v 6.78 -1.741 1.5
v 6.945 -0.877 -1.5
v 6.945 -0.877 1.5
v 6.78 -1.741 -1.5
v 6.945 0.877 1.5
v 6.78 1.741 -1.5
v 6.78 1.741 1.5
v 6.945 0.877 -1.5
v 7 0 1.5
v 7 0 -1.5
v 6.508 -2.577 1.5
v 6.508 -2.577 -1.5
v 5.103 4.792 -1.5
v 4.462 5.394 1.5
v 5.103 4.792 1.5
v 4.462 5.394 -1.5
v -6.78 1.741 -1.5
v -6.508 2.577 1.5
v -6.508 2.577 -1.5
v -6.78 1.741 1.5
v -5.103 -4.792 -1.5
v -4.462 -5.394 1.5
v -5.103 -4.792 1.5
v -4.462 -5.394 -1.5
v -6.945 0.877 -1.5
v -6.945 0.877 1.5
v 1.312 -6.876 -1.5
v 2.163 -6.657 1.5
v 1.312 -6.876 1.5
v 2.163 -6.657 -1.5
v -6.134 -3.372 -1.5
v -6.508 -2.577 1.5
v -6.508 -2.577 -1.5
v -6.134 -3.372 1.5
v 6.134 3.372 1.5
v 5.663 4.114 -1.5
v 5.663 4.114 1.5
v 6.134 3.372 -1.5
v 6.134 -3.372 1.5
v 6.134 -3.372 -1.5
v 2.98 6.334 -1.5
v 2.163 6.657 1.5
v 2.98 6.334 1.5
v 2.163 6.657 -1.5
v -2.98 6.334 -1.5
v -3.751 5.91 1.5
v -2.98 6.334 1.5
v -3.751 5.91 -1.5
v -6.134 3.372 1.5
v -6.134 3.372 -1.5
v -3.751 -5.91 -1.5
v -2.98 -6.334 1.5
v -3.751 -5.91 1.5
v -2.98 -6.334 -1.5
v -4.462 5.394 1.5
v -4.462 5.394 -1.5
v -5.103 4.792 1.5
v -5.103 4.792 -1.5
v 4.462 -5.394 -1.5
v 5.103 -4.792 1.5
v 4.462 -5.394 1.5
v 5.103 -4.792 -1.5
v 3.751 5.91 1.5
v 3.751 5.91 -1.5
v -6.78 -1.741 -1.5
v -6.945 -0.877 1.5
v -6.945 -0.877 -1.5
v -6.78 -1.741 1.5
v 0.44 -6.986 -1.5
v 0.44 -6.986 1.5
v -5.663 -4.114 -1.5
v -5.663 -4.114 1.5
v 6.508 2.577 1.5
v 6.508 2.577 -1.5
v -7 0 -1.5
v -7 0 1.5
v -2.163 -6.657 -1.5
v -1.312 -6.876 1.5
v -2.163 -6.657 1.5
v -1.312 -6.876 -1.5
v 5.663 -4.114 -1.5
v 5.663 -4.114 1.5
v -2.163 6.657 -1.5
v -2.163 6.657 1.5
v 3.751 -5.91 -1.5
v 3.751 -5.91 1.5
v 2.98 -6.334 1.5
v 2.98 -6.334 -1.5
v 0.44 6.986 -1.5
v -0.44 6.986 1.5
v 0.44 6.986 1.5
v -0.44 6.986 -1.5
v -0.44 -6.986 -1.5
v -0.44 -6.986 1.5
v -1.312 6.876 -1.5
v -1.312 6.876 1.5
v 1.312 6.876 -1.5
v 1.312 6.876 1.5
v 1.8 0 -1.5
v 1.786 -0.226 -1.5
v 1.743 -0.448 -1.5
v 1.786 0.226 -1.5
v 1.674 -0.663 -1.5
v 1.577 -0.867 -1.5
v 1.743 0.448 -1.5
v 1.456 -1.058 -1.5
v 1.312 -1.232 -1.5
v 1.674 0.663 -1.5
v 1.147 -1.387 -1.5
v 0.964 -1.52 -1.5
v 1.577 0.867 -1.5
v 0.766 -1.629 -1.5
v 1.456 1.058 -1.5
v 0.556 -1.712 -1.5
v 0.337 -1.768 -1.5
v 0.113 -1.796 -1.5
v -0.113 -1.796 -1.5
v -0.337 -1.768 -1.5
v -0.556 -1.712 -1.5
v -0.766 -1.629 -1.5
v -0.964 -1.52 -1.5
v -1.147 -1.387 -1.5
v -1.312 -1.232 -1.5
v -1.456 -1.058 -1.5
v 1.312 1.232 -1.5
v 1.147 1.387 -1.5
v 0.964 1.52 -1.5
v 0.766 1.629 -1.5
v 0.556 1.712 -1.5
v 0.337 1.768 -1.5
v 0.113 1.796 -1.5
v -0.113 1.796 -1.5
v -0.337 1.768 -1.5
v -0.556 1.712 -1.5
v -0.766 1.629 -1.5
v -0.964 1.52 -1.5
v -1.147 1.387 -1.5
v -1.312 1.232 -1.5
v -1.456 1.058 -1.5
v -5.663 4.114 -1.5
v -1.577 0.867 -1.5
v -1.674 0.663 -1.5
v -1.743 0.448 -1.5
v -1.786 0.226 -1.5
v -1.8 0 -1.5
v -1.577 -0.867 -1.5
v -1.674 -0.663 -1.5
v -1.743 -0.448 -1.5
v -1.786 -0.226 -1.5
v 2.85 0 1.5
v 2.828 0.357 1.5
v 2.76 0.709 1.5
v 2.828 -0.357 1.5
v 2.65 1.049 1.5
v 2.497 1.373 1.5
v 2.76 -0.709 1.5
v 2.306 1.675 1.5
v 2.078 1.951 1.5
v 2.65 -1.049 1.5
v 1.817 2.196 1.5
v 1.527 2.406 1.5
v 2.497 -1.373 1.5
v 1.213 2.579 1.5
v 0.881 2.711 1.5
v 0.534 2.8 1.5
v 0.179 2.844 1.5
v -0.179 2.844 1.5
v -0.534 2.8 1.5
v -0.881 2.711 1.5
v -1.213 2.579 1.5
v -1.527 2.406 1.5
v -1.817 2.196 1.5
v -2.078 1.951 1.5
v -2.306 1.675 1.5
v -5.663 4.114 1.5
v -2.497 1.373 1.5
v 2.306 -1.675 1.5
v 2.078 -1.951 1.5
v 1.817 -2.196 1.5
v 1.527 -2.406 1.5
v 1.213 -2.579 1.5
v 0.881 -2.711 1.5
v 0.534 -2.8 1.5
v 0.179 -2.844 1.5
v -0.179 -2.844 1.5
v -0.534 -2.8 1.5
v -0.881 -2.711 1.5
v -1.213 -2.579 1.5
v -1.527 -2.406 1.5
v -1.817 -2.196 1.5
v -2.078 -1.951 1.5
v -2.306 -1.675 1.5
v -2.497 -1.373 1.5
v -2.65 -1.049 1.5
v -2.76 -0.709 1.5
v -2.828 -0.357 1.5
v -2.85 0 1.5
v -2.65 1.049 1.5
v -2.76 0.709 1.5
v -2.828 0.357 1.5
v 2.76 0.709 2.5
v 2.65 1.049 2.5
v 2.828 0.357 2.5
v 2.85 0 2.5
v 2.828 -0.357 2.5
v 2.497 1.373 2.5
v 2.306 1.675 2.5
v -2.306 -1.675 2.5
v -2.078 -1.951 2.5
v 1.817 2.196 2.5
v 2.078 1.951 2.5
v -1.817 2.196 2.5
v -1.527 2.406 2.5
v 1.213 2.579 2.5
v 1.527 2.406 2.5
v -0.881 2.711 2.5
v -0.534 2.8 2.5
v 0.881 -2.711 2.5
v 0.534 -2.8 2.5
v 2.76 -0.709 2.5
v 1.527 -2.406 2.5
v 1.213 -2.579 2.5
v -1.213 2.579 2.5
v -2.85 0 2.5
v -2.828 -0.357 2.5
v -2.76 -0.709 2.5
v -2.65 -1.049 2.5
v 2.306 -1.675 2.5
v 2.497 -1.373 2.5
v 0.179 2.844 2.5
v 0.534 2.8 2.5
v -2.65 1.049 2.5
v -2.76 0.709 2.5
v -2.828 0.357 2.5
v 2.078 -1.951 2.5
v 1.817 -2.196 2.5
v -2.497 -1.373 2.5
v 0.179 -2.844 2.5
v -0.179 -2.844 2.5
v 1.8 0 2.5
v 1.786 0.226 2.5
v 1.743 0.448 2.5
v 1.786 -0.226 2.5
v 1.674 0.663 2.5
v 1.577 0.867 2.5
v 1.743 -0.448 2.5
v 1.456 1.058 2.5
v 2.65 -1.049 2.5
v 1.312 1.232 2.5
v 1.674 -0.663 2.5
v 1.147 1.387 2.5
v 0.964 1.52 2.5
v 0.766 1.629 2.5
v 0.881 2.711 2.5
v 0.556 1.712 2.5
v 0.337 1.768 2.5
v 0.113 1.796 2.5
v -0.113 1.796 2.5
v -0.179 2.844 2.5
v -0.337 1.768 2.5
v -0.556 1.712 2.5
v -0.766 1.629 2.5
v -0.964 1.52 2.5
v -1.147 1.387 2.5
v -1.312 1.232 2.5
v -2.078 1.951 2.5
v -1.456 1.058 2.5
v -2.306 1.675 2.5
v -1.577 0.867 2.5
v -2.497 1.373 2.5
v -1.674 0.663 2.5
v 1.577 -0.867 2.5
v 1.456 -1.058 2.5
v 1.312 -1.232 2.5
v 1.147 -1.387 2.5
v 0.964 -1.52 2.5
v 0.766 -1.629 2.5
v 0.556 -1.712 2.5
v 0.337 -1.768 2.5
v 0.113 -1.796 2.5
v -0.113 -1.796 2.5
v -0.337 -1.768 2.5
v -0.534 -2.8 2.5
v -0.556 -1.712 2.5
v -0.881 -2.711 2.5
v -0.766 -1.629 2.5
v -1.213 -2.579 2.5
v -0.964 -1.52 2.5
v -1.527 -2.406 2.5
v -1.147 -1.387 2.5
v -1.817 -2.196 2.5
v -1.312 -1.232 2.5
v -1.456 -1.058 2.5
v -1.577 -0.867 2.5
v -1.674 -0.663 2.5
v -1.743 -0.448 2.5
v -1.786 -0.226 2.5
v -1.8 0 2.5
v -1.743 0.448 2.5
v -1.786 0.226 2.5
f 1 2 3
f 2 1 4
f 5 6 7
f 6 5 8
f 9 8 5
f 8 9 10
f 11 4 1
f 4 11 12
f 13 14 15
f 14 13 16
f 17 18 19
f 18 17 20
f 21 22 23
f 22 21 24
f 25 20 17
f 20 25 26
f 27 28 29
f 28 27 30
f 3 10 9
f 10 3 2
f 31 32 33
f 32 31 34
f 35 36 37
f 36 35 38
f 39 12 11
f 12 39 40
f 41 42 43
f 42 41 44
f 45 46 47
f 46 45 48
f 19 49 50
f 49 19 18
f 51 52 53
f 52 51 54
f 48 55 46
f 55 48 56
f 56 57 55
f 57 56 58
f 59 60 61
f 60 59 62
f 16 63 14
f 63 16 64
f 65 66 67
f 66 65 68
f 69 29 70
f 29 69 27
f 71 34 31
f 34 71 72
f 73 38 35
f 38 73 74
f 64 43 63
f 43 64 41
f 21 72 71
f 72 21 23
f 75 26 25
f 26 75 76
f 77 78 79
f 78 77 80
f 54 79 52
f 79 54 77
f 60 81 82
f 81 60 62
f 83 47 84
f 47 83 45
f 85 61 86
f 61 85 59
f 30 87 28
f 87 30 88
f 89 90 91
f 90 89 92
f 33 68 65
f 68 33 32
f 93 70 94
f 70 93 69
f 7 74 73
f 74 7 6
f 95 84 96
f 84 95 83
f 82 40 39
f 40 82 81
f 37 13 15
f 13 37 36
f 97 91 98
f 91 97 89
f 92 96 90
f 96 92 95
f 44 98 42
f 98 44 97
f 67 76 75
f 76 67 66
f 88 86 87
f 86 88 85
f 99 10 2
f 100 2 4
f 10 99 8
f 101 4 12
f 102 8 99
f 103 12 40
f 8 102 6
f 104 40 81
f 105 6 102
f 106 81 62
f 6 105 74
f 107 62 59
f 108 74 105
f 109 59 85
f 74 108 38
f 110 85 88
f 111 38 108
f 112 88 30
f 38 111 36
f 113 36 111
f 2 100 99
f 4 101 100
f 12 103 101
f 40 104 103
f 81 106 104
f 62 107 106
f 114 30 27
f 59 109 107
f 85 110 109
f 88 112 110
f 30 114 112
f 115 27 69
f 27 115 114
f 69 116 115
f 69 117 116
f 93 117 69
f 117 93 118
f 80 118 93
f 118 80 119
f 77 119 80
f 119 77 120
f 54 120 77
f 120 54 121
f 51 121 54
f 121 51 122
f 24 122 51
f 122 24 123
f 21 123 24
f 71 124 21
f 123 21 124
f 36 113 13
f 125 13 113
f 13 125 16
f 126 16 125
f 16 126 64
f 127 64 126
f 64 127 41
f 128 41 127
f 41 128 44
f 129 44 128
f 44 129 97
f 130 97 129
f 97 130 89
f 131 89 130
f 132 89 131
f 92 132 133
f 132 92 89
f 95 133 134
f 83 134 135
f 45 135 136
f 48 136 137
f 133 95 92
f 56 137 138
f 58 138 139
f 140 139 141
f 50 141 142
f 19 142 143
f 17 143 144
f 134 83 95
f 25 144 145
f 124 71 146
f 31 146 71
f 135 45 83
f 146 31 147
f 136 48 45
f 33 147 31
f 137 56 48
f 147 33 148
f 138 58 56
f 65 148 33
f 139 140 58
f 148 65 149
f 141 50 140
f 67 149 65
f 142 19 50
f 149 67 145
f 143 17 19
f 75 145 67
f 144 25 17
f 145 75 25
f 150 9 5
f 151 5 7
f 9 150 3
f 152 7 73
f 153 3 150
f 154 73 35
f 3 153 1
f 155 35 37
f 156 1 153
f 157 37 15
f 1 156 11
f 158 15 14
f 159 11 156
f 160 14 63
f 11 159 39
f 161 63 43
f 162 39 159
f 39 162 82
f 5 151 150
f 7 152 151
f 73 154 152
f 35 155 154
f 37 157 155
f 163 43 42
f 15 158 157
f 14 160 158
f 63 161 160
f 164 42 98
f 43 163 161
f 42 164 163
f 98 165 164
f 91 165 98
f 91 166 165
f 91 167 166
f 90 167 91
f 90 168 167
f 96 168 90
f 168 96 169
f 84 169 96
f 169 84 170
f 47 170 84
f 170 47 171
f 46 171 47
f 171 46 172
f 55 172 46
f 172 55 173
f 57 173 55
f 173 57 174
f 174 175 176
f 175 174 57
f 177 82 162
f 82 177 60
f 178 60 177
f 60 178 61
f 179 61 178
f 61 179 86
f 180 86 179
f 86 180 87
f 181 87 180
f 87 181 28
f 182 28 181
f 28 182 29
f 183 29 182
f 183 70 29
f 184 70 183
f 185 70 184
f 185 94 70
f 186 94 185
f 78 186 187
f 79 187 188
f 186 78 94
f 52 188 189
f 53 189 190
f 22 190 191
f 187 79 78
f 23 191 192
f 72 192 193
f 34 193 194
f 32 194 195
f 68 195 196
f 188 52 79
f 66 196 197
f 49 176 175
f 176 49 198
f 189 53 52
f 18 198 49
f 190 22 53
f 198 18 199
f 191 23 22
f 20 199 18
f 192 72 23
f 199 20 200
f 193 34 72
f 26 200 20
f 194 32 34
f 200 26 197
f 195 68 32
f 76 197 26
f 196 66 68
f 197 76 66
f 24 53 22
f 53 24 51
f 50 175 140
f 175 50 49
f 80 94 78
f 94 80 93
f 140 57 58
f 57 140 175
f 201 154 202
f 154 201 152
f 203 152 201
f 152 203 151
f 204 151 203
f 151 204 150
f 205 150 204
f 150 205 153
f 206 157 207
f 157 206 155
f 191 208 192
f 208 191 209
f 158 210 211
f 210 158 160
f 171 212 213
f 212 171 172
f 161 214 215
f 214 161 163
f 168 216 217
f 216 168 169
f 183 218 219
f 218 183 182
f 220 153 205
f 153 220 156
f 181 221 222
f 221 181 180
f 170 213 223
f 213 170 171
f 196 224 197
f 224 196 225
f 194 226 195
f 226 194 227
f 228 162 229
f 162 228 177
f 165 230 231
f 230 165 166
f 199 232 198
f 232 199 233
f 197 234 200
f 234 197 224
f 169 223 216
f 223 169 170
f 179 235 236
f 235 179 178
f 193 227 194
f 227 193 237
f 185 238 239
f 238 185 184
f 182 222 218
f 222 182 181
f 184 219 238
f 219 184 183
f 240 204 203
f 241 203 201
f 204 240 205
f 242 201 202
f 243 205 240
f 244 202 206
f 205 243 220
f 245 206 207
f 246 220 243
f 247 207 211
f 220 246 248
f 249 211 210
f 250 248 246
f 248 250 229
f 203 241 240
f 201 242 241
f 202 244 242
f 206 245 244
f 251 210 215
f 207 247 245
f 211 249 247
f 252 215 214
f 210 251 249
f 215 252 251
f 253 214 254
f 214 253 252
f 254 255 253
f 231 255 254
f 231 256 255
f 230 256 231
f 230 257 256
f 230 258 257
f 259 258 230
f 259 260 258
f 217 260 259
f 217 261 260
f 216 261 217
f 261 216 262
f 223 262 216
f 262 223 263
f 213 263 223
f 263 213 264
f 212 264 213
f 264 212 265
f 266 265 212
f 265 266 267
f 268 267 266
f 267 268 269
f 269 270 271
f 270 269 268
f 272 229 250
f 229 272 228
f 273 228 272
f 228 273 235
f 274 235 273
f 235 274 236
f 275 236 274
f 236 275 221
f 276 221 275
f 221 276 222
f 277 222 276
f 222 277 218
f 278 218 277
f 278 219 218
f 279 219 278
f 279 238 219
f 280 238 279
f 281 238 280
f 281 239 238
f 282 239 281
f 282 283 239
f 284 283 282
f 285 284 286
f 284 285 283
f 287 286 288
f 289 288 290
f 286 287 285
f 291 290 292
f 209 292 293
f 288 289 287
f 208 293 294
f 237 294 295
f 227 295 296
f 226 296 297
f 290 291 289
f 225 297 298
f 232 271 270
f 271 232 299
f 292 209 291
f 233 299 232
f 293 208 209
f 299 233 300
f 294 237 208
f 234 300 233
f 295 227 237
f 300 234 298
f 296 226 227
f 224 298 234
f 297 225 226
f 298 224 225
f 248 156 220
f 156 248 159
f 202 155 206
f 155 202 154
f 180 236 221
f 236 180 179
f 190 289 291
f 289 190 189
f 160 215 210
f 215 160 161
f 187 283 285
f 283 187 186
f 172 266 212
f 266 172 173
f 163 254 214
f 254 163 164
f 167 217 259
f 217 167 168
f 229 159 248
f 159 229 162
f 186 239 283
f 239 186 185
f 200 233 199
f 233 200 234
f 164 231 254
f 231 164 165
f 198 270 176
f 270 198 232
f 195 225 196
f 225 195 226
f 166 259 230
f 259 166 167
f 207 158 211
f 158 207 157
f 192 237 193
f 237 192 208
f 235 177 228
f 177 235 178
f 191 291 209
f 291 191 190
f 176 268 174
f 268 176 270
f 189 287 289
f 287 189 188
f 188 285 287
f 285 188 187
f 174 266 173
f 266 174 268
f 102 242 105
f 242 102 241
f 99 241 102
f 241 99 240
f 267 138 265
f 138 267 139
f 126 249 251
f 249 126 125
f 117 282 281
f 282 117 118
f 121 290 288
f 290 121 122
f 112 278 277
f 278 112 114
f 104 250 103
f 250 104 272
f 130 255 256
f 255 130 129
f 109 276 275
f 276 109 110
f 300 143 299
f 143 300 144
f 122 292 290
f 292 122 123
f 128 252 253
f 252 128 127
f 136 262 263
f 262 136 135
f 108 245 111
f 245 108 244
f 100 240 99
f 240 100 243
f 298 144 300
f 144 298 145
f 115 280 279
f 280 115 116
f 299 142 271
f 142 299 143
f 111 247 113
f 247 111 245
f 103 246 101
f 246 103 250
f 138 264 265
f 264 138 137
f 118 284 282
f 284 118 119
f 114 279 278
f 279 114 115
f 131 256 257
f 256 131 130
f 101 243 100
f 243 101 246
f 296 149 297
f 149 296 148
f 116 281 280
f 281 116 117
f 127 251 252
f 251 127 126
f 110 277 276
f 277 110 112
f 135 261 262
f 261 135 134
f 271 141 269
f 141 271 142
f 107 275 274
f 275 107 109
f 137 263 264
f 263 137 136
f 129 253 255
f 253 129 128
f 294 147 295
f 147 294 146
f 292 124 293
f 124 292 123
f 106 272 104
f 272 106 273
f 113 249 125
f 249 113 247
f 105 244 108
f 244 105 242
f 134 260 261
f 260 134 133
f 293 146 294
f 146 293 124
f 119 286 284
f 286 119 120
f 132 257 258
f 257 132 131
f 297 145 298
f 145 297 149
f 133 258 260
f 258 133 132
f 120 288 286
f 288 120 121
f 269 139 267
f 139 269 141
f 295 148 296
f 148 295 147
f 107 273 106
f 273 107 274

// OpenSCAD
$fn = 50;


difference() {
	union() {
		translate(v = [0, 0, -1.5000000000]) {
			cylinder(h = 3, r = 7.0000000000);
		}
		translate(v = [0, 0, -1.5000000000]) {
			cylinder(h = 4, r = 2.8500000000);
		}
	}
	union() {
		translate(v = [0, 0, -100.0000000000]) {
			cylinder(h = 200, r = 1.8000000000);
		}
	}
}
